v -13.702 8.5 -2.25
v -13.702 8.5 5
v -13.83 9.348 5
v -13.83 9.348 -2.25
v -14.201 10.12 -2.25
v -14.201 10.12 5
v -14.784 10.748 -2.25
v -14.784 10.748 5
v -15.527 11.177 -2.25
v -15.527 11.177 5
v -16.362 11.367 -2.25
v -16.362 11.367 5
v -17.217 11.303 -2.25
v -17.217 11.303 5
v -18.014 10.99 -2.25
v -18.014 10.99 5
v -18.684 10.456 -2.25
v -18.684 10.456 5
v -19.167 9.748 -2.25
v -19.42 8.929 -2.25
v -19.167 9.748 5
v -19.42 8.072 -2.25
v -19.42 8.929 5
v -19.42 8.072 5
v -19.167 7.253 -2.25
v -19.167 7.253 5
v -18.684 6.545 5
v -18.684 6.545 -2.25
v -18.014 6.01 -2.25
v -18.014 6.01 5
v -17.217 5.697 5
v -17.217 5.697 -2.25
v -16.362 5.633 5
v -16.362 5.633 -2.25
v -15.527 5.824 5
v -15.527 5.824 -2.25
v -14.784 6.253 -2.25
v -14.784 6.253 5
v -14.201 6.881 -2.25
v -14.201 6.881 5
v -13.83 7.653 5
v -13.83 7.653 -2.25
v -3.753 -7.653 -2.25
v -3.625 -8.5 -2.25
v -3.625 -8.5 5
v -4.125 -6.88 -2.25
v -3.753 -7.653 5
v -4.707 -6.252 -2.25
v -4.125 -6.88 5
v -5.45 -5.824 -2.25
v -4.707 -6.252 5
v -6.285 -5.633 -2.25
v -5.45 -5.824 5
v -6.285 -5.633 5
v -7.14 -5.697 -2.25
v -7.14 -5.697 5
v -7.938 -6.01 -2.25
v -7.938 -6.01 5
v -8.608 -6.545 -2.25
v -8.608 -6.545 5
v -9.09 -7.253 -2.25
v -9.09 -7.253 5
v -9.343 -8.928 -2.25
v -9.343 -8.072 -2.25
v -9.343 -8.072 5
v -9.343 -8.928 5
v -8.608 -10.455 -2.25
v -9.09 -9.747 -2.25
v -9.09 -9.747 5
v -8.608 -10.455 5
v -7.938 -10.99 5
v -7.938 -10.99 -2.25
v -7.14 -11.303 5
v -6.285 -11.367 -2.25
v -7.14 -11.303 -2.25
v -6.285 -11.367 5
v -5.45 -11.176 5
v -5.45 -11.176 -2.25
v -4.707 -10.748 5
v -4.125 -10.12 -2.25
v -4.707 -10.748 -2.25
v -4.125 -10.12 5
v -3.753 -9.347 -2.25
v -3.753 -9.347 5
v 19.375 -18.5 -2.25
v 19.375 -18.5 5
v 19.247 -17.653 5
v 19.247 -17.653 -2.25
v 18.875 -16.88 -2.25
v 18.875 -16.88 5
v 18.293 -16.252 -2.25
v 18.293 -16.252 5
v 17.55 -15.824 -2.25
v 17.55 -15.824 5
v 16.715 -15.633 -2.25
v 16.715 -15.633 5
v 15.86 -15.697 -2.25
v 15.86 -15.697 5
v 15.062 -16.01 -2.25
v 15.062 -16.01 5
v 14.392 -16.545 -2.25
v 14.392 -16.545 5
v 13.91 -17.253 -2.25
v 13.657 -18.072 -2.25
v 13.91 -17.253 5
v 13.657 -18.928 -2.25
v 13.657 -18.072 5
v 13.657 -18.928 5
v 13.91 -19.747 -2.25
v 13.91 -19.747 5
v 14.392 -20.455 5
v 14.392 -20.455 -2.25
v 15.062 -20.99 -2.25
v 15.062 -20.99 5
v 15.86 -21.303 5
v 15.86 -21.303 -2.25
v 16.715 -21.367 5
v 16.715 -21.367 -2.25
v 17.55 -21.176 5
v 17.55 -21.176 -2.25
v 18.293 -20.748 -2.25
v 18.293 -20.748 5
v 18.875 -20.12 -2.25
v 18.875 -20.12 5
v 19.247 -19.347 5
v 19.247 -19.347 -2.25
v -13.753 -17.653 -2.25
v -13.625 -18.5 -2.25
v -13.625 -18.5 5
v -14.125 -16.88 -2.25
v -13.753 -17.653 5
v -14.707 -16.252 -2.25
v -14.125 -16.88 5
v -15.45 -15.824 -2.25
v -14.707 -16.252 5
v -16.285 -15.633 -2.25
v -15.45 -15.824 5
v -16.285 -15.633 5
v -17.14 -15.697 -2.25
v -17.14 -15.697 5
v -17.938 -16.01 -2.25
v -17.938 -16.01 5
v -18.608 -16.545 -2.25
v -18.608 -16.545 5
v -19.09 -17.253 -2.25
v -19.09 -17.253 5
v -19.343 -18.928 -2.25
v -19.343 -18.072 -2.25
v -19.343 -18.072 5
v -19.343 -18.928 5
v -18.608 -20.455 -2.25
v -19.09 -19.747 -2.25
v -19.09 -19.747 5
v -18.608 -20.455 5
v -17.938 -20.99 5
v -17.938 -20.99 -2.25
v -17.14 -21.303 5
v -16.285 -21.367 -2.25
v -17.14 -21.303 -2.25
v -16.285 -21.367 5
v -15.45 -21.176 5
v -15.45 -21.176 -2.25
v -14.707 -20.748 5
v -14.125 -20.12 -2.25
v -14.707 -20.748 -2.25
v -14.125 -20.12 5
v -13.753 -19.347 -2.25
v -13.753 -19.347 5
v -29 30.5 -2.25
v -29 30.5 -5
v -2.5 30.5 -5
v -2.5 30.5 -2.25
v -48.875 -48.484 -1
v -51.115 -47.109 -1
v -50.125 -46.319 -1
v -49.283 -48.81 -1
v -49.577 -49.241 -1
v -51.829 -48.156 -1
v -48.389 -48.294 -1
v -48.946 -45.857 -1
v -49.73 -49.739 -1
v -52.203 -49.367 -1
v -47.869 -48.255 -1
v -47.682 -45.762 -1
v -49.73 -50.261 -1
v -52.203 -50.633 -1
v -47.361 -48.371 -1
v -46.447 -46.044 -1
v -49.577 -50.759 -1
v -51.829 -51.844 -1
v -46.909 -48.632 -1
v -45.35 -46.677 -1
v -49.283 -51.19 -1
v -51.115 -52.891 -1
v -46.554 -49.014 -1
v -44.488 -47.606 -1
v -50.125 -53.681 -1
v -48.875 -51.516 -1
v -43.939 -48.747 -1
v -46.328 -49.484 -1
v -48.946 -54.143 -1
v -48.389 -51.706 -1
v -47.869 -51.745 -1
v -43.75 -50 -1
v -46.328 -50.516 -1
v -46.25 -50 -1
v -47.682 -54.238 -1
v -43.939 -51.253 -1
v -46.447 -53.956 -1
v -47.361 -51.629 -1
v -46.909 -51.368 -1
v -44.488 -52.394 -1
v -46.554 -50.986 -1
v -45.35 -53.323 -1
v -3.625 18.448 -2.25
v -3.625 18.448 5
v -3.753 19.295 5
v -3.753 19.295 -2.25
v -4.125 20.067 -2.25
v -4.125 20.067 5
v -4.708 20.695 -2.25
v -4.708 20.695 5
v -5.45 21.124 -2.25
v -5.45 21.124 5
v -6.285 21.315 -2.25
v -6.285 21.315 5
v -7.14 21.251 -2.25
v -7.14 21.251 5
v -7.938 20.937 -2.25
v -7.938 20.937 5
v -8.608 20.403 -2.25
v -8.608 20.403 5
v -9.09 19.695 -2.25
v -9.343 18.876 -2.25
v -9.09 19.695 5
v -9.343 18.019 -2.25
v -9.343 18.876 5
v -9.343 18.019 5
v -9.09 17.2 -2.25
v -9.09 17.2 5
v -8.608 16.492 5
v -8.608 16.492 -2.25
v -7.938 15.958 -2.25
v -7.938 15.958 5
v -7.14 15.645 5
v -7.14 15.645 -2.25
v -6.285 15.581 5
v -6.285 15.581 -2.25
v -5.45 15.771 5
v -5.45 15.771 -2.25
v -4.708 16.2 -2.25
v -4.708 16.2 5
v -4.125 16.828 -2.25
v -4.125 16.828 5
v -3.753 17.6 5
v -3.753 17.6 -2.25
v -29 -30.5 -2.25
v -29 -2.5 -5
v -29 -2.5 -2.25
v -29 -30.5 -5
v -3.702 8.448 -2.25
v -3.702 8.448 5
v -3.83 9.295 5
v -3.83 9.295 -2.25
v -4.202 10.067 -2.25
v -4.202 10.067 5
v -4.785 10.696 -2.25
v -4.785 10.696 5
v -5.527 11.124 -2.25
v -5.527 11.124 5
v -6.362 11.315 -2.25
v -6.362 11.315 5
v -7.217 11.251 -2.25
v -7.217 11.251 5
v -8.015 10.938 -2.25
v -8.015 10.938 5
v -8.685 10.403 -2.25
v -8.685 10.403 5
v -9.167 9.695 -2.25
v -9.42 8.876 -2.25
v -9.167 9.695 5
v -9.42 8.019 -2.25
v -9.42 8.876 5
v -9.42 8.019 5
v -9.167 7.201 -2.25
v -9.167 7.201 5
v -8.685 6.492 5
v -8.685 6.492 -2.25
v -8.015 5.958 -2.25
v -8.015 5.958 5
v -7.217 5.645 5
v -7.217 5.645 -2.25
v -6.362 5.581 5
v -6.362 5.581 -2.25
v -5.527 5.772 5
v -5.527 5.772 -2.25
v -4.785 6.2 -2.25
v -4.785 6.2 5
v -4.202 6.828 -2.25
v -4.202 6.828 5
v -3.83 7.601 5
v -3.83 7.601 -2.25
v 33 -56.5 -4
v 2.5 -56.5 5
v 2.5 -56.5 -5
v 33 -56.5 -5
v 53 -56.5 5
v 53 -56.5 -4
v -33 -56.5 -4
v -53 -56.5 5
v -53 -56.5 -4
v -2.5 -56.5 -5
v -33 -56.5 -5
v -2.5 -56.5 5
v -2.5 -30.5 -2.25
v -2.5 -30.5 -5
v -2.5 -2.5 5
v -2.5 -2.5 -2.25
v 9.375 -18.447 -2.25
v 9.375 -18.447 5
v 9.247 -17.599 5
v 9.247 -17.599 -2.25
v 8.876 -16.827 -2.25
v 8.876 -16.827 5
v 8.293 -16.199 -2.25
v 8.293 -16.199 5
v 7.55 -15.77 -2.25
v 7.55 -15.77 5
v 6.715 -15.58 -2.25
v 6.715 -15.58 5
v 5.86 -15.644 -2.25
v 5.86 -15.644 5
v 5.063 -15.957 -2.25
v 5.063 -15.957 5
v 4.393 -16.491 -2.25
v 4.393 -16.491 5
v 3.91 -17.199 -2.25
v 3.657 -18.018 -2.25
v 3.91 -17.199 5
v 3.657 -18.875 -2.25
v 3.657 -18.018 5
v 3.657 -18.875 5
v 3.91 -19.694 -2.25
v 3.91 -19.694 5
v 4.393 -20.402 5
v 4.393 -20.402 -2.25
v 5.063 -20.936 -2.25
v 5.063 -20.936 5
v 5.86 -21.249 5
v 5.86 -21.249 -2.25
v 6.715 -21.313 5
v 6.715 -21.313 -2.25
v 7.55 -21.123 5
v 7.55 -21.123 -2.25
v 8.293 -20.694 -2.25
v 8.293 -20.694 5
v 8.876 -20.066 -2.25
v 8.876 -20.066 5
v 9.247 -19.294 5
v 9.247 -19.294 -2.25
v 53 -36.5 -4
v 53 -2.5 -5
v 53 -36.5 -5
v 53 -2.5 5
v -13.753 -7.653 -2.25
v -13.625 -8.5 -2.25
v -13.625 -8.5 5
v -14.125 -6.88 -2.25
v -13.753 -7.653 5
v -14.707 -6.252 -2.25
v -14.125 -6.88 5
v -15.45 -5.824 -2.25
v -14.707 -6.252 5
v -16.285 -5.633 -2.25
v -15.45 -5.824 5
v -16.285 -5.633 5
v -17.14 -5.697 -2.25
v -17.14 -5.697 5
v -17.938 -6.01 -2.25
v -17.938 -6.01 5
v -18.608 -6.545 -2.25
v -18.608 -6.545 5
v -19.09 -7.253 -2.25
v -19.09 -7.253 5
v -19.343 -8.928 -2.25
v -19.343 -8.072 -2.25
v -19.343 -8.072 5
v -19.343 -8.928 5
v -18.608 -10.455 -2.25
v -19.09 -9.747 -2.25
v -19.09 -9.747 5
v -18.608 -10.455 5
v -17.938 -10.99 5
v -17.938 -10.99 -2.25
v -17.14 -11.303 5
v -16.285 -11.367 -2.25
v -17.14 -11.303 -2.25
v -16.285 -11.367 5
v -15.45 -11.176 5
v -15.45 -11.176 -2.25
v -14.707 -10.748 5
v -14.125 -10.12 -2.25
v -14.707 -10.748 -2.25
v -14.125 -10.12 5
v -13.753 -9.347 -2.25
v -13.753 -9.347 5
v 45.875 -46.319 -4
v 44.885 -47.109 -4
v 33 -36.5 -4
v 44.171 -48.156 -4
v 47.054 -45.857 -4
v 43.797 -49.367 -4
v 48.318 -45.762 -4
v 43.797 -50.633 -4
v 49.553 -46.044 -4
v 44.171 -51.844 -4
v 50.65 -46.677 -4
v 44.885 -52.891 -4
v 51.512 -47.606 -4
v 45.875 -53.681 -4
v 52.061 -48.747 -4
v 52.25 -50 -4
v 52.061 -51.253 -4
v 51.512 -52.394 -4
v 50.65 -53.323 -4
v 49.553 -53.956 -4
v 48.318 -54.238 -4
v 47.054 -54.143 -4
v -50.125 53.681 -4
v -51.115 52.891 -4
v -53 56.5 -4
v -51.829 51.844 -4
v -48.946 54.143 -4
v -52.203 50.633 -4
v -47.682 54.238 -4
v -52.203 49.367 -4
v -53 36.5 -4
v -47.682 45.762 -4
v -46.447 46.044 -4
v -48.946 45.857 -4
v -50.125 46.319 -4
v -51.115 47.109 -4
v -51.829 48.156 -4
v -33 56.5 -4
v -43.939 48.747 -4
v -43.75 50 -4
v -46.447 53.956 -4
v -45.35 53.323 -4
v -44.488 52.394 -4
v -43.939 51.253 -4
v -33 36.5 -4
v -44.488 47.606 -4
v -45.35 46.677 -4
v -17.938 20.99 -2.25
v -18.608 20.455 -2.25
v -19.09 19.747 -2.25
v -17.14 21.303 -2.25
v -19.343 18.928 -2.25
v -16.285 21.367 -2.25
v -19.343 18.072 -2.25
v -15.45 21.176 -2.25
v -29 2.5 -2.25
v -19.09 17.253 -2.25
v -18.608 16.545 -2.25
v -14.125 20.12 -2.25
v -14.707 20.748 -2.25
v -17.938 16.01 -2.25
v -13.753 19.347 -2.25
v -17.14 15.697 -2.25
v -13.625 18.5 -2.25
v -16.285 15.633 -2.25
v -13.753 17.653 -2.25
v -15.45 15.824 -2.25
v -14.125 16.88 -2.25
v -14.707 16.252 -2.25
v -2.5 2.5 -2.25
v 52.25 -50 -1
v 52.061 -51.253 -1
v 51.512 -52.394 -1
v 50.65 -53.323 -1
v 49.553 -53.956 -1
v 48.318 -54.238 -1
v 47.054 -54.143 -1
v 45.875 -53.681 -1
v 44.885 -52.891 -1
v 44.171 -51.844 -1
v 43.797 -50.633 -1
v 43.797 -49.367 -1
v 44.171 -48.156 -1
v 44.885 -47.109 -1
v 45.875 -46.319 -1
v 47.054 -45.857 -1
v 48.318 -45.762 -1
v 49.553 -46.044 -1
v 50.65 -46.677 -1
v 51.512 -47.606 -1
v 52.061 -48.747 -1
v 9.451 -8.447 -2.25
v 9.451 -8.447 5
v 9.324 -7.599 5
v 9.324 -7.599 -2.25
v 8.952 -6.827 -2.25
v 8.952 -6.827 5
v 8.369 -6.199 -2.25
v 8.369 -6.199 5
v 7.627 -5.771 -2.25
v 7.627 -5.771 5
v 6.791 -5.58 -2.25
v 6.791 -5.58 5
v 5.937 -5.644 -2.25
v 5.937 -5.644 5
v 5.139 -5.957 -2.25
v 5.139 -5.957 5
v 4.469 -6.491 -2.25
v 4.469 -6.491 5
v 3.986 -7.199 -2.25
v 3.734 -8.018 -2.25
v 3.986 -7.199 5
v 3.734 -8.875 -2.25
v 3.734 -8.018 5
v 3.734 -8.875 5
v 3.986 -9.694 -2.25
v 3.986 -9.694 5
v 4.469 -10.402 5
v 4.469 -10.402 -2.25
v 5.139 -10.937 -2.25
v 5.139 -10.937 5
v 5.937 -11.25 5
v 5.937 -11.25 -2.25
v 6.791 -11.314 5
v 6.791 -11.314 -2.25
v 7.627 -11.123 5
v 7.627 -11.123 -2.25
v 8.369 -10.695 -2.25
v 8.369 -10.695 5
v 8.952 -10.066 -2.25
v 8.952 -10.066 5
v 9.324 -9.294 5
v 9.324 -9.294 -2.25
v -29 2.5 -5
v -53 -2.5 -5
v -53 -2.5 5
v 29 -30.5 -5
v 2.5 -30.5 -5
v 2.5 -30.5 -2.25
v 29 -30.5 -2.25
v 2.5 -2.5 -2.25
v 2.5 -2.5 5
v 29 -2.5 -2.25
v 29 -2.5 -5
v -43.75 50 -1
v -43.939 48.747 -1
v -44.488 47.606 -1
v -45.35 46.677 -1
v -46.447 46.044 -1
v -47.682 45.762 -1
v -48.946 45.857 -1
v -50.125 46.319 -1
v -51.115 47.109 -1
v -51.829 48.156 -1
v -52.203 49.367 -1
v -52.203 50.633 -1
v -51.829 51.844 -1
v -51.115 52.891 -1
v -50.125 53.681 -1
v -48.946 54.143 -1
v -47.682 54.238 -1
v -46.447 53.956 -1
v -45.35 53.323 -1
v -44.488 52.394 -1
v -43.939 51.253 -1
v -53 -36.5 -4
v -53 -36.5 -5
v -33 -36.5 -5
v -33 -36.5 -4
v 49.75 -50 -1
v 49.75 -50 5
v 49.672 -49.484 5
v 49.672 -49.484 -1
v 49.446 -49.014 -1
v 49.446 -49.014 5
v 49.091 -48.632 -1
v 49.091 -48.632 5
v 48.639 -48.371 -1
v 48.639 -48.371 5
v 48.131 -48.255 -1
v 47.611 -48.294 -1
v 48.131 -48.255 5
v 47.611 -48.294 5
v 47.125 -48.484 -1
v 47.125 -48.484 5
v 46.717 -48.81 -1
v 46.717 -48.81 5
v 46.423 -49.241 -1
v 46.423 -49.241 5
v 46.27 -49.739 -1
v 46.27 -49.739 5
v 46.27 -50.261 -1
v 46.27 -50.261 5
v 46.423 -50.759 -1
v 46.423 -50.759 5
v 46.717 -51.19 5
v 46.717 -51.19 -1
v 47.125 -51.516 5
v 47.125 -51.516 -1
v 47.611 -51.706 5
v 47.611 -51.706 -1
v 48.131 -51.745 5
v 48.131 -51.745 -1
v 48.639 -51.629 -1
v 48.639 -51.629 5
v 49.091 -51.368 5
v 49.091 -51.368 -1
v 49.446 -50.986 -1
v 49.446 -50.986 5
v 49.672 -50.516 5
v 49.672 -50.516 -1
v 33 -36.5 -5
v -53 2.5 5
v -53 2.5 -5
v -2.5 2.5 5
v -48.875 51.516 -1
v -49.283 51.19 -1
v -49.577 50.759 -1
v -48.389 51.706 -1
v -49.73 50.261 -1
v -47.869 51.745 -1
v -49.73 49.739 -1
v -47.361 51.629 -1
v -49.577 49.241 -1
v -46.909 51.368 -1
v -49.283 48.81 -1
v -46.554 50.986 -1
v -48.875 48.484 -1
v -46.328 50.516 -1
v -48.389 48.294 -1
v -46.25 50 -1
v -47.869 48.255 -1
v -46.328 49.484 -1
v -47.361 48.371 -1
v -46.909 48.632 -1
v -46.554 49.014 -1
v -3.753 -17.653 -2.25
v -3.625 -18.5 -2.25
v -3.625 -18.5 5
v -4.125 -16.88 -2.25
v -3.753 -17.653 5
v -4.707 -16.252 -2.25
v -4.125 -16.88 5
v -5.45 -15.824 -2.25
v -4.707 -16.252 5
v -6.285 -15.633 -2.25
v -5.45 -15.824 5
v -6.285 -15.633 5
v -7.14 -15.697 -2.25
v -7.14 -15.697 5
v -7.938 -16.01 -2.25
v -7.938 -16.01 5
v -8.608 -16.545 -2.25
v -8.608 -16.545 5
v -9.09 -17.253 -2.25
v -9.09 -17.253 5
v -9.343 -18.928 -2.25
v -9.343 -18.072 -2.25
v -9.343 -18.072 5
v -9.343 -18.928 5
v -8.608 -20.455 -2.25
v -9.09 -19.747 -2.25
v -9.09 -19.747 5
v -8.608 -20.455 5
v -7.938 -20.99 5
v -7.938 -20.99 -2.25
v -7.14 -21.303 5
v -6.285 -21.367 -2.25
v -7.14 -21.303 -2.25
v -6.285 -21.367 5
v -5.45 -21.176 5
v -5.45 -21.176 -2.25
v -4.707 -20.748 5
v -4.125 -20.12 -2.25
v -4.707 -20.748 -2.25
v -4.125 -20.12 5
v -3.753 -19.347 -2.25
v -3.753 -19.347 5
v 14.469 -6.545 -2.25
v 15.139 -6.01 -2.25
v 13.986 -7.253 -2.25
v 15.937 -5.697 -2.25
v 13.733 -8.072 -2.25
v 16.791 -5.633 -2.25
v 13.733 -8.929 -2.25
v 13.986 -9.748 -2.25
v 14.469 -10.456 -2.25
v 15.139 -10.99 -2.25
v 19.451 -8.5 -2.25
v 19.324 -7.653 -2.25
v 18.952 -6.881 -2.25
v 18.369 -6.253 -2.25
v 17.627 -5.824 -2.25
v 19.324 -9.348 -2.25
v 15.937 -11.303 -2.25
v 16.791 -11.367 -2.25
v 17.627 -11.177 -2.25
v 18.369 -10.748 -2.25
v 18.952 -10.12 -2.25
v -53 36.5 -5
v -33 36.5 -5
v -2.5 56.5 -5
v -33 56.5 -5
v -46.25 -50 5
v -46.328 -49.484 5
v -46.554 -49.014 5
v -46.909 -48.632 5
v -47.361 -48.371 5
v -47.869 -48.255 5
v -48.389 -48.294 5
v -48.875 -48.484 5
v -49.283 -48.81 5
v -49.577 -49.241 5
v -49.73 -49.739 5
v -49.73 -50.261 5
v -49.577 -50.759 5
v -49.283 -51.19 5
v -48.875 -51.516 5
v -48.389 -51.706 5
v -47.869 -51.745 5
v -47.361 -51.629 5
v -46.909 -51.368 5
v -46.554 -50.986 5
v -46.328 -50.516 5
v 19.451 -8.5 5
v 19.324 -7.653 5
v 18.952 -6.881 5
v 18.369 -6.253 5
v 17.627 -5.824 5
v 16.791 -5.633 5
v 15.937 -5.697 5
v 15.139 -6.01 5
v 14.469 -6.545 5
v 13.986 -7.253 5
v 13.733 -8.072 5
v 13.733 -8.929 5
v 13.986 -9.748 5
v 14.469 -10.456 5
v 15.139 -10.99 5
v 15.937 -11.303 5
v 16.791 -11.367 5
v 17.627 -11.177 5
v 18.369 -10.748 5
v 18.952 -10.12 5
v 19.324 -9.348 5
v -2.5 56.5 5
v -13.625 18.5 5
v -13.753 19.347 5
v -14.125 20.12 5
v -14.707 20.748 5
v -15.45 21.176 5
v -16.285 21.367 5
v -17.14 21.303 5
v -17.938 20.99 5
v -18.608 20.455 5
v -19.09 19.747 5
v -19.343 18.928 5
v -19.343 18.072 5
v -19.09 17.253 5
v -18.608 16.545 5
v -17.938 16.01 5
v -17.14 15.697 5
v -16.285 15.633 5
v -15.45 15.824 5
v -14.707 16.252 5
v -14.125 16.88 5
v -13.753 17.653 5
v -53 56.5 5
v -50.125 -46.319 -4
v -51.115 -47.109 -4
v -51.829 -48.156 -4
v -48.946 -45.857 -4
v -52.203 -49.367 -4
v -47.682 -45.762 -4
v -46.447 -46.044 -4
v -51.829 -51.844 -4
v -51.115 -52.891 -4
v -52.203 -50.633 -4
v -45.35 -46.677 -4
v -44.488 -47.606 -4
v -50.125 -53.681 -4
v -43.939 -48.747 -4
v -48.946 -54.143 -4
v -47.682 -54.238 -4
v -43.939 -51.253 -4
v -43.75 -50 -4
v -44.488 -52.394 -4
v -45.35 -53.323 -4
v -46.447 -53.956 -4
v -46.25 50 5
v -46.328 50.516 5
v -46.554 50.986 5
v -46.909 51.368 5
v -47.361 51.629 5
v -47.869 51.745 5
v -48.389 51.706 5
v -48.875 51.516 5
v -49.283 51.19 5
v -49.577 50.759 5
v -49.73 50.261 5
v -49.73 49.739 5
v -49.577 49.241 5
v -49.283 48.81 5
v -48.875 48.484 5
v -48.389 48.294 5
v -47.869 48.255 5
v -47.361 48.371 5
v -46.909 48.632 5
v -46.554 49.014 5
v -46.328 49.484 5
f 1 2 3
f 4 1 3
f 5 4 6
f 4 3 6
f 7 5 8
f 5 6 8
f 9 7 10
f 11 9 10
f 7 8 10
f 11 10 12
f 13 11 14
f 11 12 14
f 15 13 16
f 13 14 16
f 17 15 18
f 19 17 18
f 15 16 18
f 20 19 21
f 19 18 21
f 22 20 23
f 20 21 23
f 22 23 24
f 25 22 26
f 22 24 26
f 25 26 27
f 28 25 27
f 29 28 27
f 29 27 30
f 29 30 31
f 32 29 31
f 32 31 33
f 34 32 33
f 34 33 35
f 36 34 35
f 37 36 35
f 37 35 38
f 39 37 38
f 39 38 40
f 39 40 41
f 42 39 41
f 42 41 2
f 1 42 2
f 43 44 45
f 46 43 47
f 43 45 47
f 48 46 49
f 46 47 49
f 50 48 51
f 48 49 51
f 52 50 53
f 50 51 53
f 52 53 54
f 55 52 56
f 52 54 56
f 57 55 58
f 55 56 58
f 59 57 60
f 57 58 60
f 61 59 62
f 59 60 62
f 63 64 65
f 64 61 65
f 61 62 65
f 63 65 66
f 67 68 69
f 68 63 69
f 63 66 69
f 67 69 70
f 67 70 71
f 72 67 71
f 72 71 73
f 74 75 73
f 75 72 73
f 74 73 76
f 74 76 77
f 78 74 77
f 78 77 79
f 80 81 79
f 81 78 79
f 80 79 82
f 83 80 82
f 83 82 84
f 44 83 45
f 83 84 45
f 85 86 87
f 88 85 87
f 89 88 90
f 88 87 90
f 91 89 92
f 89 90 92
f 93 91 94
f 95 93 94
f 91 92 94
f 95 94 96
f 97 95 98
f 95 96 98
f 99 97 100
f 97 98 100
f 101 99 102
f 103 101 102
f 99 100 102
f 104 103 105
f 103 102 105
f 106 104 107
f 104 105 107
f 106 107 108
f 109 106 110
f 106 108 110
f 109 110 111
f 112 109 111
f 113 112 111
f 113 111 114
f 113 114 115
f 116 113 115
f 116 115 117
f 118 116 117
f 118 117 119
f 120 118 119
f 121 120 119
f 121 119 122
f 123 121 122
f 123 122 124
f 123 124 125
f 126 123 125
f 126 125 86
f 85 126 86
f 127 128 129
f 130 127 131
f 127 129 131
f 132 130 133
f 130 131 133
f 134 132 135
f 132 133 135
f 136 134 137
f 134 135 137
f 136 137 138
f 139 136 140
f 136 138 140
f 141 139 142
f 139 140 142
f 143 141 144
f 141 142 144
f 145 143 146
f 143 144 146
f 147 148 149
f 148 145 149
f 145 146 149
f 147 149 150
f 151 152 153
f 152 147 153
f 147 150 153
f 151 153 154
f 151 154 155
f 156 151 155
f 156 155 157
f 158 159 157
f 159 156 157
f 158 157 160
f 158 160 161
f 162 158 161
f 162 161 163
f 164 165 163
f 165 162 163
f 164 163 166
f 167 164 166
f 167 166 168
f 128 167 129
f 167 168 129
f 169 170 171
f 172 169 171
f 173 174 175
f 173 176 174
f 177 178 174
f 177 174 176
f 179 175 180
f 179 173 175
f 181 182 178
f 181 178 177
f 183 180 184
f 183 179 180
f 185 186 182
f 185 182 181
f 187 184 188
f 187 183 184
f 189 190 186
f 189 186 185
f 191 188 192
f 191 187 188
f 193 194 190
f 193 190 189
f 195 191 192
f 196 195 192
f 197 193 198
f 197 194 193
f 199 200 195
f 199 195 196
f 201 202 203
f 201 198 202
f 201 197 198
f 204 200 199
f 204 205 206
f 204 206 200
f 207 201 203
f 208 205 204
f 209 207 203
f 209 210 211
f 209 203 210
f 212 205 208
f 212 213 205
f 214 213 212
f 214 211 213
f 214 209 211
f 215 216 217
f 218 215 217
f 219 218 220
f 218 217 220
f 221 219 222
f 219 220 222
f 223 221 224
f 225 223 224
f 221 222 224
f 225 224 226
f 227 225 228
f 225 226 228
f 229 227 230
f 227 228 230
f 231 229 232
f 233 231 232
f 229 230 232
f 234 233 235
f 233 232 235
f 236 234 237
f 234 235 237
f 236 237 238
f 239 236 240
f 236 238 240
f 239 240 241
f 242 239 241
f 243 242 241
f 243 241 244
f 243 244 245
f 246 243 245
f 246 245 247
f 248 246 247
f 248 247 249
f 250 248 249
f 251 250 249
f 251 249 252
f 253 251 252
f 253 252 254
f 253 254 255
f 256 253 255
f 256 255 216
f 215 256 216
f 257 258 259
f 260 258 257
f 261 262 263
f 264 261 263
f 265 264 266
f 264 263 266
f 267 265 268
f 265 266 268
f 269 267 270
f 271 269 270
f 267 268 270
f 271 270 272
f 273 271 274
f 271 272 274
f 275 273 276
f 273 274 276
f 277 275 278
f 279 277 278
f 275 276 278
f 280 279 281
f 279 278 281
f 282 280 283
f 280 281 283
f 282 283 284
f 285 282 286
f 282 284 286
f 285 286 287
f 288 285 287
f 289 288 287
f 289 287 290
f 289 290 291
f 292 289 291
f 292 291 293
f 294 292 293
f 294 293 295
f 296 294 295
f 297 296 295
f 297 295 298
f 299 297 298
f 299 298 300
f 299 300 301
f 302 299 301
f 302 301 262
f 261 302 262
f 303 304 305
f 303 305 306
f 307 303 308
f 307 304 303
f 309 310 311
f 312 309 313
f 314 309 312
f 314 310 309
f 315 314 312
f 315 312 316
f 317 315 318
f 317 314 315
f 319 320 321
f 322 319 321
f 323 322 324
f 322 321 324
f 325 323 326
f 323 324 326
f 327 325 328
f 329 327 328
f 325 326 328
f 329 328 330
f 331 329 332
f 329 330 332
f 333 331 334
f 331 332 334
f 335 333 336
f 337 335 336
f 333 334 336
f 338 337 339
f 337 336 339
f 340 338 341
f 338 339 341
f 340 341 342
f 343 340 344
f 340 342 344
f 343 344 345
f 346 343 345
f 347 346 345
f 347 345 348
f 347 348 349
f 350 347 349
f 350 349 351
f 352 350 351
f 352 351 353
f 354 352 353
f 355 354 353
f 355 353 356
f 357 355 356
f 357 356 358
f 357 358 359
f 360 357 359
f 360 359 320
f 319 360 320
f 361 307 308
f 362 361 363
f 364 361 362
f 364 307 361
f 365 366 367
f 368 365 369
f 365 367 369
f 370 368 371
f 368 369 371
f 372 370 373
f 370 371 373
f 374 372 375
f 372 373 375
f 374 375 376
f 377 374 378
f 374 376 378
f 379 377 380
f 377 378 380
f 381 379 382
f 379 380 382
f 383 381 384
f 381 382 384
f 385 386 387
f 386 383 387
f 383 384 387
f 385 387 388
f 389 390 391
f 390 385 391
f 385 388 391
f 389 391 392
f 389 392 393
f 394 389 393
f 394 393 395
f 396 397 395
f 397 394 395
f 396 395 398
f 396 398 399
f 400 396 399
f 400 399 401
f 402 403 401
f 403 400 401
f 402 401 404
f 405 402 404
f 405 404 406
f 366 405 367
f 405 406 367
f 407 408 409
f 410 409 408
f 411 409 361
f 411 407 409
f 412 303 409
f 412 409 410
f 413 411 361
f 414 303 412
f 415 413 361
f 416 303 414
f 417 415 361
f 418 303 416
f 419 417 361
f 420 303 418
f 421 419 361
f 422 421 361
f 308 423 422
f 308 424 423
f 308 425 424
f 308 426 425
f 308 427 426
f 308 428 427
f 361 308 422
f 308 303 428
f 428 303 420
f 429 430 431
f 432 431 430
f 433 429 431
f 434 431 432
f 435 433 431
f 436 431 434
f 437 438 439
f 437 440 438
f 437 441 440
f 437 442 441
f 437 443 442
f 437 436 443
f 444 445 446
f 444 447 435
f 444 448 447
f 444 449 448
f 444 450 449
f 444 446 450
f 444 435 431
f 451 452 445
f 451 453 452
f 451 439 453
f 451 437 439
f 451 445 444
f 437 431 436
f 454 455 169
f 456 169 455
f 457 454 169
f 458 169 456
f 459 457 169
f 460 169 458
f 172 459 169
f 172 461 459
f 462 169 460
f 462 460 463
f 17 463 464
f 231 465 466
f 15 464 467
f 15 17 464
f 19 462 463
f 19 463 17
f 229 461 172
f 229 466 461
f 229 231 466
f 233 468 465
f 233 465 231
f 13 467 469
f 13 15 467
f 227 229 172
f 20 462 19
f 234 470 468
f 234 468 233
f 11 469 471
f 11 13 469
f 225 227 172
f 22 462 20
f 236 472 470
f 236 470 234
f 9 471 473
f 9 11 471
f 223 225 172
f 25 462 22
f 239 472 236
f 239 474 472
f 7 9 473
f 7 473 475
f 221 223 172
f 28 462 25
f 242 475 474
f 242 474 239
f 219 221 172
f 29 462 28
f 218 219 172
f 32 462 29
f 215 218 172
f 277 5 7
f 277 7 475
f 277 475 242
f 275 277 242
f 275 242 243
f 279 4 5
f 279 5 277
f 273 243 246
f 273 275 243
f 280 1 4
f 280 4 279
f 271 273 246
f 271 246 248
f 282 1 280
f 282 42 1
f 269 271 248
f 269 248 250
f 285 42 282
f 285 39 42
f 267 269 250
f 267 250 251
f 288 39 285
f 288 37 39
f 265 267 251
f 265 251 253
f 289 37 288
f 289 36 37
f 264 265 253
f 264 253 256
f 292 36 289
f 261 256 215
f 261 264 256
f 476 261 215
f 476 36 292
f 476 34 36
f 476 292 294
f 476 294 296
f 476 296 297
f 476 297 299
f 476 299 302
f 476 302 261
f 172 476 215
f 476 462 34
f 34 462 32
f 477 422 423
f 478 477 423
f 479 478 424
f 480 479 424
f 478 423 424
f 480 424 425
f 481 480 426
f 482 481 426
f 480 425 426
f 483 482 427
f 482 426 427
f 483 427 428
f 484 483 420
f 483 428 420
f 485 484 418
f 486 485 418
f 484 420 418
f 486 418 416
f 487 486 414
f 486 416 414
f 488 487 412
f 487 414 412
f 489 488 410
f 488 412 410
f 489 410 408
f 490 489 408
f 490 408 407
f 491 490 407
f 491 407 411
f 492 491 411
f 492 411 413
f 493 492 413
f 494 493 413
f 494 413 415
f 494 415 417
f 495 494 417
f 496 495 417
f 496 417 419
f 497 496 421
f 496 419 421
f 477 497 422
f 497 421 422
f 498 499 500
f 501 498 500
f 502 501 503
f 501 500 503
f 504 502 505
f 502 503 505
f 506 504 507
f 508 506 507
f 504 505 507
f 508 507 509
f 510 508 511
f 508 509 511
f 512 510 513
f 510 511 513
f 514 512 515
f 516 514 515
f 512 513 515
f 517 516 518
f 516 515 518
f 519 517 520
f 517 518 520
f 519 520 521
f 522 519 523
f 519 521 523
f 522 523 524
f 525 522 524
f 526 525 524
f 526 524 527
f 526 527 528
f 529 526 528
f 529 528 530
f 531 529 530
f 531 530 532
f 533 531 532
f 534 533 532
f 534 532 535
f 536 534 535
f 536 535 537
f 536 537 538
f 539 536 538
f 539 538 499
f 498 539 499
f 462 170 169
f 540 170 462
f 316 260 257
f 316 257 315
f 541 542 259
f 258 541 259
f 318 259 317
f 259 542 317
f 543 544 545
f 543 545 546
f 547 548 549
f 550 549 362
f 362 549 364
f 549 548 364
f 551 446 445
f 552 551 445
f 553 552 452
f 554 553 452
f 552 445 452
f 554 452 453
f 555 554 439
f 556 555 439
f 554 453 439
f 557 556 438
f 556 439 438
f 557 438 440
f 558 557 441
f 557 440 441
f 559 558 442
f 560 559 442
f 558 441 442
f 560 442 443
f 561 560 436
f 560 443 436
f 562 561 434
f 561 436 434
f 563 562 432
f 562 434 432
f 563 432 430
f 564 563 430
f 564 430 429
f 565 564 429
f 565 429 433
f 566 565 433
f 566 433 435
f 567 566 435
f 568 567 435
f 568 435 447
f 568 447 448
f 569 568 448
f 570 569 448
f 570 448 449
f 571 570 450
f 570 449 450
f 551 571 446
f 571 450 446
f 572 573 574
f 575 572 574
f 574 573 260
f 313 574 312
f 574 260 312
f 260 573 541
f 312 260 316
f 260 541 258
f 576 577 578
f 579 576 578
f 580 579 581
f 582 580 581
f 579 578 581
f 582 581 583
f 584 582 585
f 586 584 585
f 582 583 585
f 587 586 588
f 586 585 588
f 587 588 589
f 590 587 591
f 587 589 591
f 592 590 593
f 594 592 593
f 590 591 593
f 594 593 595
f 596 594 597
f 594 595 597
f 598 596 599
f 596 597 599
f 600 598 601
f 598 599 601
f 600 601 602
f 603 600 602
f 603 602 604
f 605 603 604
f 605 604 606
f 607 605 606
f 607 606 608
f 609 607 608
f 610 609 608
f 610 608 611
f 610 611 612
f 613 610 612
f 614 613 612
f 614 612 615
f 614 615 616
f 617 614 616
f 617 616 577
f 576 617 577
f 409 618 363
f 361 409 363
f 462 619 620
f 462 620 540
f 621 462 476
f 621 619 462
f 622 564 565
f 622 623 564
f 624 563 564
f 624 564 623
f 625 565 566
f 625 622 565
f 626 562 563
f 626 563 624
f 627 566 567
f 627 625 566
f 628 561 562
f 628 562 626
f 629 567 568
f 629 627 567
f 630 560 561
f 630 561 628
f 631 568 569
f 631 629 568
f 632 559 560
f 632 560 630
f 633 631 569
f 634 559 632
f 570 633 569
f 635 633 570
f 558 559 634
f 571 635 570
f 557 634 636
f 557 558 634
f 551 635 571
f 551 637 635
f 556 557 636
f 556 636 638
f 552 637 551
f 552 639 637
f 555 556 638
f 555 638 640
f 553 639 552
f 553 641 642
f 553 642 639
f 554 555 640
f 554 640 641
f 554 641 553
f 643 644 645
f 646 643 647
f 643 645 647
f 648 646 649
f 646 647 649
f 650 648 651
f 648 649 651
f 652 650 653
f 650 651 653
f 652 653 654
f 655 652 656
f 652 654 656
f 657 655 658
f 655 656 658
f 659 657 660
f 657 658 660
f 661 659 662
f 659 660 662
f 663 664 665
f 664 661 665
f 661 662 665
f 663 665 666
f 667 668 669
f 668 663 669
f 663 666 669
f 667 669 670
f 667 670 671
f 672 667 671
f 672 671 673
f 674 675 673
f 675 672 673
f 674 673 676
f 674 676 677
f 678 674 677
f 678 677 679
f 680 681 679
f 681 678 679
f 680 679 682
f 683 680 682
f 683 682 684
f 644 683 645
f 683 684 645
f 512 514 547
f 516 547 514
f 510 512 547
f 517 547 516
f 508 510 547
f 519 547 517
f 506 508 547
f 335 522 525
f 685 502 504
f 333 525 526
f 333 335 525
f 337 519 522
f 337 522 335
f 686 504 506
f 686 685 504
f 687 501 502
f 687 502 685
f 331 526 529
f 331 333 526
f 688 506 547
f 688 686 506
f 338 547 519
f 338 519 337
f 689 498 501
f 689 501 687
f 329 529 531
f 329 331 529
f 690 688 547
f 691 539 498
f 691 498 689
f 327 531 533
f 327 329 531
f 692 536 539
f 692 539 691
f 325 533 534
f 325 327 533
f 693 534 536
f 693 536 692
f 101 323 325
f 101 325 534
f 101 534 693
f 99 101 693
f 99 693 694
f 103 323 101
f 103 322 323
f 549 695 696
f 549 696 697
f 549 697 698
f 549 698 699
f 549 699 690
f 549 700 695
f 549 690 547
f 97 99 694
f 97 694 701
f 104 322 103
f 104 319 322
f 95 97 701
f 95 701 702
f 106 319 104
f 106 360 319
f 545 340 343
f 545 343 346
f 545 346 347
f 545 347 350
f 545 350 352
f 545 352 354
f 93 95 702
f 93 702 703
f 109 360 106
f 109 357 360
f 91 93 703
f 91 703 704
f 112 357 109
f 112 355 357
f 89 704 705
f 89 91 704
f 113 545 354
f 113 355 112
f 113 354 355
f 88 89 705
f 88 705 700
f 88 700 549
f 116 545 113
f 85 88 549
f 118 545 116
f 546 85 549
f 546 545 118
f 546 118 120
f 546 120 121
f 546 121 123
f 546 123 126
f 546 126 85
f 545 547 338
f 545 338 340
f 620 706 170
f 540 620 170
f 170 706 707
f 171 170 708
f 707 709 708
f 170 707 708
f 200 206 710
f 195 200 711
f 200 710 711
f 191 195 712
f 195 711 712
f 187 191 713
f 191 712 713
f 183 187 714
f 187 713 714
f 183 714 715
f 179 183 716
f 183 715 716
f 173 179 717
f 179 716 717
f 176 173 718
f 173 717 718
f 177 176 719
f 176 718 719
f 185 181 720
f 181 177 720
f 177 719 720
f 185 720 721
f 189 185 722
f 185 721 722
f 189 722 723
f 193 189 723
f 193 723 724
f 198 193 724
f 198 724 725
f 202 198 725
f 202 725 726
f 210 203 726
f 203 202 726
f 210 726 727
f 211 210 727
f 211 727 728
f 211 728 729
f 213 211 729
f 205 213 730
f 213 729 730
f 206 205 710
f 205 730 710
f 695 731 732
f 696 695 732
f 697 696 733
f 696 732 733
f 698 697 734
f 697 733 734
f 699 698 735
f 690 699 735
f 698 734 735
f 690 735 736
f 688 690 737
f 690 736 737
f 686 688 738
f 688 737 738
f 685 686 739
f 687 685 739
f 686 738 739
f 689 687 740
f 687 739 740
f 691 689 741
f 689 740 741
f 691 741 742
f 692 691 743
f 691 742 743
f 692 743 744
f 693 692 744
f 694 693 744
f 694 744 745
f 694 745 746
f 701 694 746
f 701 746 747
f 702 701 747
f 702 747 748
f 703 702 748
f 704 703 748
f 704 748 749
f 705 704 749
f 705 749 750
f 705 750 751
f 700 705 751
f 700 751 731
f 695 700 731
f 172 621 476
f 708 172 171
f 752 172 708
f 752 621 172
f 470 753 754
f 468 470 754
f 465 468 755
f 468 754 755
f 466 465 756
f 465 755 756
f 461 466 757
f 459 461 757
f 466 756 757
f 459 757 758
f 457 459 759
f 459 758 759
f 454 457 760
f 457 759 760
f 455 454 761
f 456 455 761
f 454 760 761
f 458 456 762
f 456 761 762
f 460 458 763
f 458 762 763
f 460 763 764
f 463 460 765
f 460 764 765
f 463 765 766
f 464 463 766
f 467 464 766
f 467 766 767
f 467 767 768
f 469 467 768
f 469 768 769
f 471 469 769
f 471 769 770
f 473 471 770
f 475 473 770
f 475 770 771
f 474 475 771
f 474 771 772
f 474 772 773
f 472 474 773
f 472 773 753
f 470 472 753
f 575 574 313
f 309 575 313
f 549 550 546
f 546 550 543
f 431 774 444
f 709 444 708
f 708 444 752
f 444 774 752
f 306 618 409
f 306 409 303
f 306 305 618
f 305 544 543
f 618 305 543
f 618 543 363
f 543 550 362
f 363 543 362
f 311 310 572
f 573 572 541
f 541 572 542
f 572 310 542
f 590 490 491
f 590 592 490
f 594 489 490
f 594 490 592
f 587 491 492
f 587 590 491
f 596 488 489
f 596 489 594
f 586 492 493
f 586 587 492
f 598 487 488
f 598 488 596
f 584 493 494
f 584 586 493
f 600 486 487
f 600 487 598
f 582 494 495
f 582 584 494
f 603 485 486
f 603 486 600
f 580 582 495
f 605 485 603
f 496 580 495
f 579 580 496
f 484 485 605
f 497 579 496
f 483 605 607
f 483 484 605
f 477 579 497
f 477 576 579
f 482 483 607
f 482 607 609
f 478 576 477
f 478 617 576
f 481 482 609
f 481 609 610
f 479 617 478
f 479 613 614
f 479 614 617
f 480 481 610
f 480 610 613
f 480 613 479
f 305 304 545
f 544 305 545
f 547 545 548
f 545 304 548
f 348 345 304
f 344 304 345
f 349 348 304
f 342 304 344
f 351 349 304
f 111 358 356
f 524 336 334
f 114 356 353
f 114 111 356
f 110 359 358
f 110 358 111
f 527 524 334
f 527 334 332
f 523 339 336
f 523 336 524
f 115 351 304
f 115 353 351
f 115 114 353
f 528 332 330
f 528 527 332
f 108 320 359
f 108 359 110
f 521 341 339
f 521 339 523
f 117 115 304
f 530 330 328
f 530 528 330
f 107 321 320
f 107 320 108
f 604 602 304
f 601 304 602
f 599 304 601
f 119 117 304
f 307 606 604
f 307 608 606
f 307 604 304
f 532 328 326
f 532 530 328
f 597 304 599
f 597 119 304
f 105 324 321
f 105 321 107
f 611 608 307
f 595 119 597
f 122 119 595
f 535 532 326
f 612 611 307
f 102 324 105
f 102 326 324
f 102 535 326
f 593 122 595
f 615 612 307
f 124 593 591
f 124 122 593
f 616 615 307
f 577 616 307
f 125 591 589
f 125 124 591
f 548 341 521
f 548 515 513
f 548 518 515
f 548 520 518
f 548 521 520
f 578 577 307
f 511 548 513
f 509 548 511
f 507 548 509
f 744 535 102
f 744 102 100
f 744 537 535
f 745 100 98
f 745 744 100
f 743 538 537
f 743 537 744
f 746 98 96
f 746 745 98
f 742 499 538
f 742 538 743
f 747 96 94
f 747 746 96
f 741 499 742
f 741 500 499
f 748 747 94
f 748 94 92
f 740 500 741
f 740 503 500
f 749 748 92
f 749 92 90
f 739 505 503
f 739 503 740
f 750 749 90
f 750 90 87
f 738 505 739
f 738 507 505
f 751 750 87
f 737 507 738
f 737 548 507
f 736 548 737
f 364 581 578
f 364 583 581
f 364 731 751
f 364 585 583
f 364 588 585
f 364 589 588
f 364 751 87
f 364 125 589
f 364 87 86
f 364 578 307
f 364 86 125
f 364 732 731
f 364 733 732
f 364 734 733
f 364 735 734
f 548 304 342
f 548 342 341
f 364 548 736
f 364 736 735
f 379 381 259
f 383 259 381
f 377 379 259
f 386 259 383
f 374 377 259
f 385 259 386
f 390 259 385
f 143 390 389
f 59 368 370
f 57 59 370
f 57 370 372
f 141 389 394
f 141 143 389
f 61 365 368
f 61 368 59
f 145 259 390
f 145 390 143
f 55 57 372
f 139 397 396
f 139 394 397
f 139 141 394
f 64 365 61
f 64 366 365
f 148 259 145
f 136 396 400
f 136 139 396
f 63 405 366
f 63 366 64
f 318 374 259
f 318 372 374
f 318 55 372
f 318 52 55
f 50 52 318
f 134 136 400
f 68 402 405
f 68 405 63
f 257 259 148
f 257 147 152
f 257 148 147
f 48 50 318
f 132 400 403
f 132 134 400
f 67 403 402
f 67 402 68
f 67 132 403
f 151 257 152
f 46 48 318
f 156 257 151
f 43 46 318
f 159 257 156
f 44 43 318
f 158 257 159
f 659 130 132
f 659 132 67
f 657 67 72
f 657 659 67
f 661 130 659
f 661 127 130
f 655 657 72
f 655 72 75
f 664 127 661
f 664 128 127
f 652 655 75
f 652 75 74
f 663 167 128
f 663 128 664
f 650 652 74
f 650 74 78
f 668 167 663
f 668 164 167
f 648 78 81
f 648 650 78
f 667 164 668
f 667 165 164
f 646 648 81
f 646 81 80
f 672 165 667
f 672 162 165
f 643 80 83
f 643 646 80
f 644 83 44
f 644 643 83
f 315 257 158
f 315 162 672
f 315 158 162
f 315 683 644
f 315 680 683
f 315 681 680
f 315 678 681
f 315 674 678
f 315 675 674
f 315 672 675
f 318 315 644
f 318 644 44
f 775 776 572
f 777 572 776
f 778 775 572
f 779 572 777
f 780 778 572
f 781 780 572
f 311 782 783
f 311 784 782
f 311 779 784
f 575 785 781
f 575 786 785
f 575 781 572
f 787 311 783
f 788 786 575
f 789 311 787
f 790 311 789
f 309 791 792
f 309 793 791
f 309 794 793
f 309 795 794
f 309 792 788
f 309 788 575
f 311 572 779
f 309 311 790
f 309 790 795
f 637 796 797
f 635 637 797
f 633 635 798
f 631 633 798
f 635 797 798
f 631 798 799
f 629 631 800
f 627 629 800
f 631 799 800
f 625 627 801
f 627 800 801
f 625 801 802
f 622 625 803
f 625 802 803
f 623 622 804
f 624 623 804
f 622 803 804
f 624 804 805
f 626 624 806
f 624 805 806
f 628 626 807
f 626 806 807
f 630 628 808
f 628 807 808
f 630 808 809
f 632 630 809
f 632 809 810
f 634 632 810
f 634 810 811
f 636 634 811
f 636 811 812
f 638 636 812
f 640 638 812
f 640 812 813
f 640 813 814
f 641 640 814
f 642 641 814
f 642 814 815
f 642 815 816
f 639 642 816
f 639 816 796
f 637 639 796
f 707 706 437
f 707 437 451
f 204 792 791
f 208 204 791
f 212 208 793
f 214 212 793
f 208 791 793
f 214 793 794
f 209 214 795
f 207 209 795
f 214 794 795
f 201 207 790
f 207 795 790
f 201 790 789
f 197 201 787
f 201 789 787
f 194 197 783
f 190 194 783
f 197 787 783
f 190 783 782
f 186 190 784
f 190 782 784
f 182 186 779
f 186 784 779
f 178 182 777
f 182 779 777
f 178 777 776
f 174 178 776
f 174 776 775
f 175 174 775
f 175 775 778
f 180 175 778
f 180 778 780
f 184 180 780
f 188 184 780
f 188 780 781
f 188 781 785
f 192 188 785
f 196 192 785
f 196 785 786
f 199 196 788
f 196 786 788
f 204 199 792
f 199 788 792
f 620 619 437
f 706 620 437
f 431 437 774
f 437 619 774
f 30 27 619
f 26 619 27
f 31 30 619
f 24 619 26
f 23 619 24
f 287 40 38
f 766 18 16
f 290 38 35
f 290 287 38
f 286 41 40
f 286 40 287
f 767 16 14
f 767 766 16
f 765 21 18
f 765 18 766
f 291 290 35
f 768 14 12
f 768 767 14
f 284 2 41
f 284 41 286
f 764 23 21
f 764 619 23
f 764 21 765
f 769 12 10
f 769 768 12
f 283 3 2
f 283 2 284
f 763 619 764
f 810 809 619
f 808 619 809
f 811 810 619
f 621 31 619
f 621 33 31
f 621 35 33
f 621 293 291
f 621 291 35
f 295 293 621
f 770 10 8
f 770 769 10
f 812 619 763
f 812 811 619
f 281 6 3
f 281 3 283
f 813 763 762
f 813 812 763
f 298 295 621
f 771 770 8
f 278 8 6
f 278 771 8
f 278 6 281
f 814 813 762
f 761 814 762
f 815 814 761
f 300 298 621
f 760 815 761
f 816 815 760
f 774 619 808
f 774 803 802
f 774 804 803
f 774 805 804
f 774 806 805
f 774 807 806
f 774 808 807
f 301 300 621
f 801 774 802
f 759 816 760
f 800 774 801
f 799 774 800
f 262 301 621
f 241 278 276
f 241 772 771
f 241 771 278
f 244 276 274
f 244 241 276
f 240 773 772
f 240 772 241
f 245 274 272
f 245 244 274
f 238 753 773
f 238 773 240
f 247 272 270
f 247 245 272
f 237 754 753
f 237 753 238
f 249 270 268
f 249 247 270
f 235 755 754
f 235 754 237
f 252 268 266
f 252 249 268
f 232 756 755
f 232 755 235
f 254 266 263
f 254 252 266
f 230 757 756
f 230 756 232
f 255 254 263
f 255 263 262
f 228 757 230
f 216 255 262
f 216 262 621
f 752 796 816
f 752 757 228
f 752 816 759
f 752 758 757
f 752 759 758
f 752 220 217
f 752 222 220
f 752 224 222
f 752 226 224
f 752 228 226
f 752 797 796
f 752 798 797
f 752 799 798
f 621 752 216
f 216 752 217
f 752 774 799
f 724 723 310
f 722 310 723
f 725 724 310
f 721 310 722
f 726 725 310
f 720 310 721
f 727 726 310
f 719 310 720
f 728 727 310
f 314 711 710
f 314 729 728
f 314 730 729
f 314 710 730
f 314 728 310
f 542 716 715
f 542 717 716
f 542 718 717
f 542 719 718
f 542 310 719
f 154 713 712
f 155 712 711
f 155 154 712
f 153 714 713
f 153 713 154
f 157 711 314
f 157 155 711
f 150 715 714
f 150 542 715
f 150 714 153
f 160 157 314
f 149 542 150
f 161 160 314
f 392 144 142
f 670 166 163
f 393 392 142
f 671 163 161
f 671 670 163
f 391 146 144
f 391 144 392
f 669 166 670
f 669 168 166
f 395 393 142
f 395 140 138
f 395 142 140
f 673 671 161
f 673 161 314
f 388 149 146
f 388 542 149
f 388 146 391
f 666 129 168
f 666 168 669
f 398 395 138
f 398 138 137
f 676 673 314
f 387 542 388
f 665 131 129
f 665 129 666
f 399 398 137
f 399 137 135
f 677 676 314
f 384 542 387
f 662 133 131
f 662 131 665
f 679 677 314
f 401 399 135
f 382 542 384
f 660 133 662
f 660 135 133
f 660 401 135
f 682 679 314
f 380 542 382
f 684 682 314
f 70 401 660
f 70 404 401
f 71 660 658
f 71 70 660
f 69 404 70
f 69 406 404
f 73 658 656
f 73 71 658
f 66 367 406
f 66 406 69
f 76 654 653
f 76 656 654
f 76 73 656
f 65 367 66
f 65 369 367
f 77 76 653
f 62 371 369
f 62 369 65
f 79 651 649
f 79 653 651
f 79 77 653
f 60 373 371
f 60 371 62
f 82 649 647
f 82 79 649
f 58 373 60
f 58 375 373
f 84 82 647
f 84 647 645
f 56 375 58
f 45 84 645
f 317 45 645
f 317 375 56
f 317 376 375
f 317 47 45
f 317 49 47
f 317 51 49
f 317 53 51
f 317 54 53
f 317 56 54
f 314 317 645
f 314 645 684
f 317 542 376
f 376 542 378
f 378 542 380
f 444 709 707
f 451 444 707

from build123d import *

# Parameters (mm, degrees)
F0_W      = 50.5
F0_H      = 54
F1_DEPTH  = 5
F2_R      = 1.75
F3_DEPTH  = 10
F4_R      = 2.875
F5_DEPTH  = 10
F6_W      = 26.5
F6_H      = 28
F6_R      = 2.875
F7_DEPTH  = 2.75
F8_W      = 20
F8_H      = 20
F8_R      = 1.75
F9_DEPTH  = 1
F10_R     = 4.25
F10_R_2   = 1.75
F11_DEPTH = 3


# Not quite as in the source:
# - a feature names something its author has since deleted; it is built from what else it names


with BuildPart() as f1:
    # F0 (on Top) → F1 (new body, symmetric)
    with BuildSketch(Plane.XY):
        with Locations((-27.75, 29.5)):
            Rectangle(F0_W, F0_H)
    extrude(amount=F1_DEPTH, both=True)


with BuildPart() as f1b:
    # F0 (on Top) → F1, piece 2 (new body, symmetric)
    with BuildSketch(Plane.XY):
        with Locations((-27.75, -29.5)):
            Rectangle(F0_W, F0_H)
    extrude(amount=F1_DEPTH, both=True)


with BuildPart() as f1c:
    # F0 (on Top) → F1, piece 3 (new body, symmetric)
    with BuildSketch(Plane.XY):
        with Locations((27.75, -29.5)):
            Rectangle(F0_W, F0_H)
    extrude(amount=F1_DEPTH, both=True)


with BuildPart() as f3_tool:
    # F2 (on face) → F3 (new body)
    with BuildSketch(Plane.XY.offset(5)):
        with Locations((-48, 50)):
            Circle(F2_R)
        with Locations((-48, -50)):
            Circle(F2_R)
        with Locations((48, -50)):
            Circle(F2_R)
    extrude(amount=-F3_DEPTH)


with BuildPart() as f1_1:
    add(f1.part)

    # F3: cut by f3_tool
    add(f3_tool.part, mode=Mode.SUBTRACT)


with BuildPart() as f1b_1:
    add(f1b.part)

    # F3: cut by f3_tool
    add(f3_tool.part, mode=Mode.SUBTRACT)


with BuildPart() as f1c_1:
    add(f1c.part)

    # F3: cut by f3_tool
    add(f3_tool.part, mode=Mode.SUBTRACT)


with BuildPart() as f5_tool:
    # F4 (on face) → F5 (new body)
    with BuildSketch(Plane.XY.offset(5)):
        with Locations((-6.5001370548, 18.4476446966)):
            Circle(F4_R)
        with Locations((-16.5, 18.5)):
            Circle(F4_R)
        with Locations((-16.5769208012, 8.5002958449)):
            Circle(F4_R)
        with Locations((-6.577057856, 8.4479405415)):
            Circle(F4_R)
        with Locations((-6.5, -8.5)):
            Circle(F4_R)
        with Locations((-16.5, -8.5)):
            Circle(F4_R)
        with Locations((-16.5, -18.5)):
            Circle(F4_R)
        with Locations((-6.5, -18.5)):
            Circle(F4_R)
        with Locations((6.5001429807, -18.4465248288)):
            Circle(F4_R)
        with Locations((6.5764766346, -8.4468161744)):
            Circle(F4_R)
        with Locations((16.5763336539, -8.5002913456)):
            Circle(F4_R)
        with Locations((16.5, -18.5)):
            Circle(F4_R)
    extrude(amount=-F5_DEPTH)


with BuildPart() as f1_2:
    add(f1_1.part)

    # F5: cut by f5_tool
    add(f5_tool.part, mode=Mode.SUBTRACT)


with BuildPart() as f1b_2:
    add(f1b_1.part)

    # F5: cut by f5_tool
    add(f5_tool.part, mode=Mode.SUBTRACT)


with BuildPart() as f1c_2:
    add(f1c_1.part)

    # F5: cut by f5_tool
    add(f5_tool.part, mode=Mode.SUBTRACT)


with BuildPart() as f7_tool:
    # F6 (on face) → F7 (new body)
    with BuildSketch(Plane(origin=(0, 0, -5), x_dir=(1, 0, 0), z_dir=(0, 0, -1))):
        with Locations((15.75, 16.5)):
            Rectangle(F6_W, F6_H)
        with Locations((-15.75, -16.5)):
            Rectangle(F6_W, F6_H)
        with Locations((-15.75, 16.5)):
            Rectangle(F6_W, F6_H)
        with Locations((-16.5, 8.5)):
            Circle(F6_R, mode=Mode.SUBTRACT)
        with Locations((-6.5, 8.5)):
            Circle(F6_R, mode=Mode.SUBTRACT)
        with Locations((-16.5, 18.5)):
            Circle(F6_R, mode=Mode.SUBTRACT)
        with Locations((-6.5, 18.5)):
            Circle(F6_R, mode=Mode.SUBTRACT)
    extrude(amount=-F7_DEPTH)


with BuildPart() as f1_3:
    add(f1_2.part)

    # F7: cut by f7_tool
    add(f7_tool.part, mode=Mode.SUBTRACT)


with BuildPart() as f1b_3:
    add(f1b_2.part)

    # F7: cut by f7_tool
    add(f7_tool.part, mode=Mode.SUBTRACT)


with BuildPart() as f1c_3:
    add(f1c_2.part)

    # F7: cut by f7_tool
    add(f7_tool.part, mode=Mode.SUBTRACT)


with BuildPart() as f9_tool:
    # F8 (on face) → F9 (new body)
    with BuildSketch(Plane(origin=(0, 0, -5), x_dir=(1, 0, 0), z_dir=(0, 0, -1))):
        with Locations((-43, -46.5)):
            Rectangle(F8_W, F8_H)
        with Locations((-48, -50)):
            Circle(F8_R, mode=Mode.SUBTRACT)
        with Locations((-43, 46.5)):
            Rectangle(F8_W, F8_H)
        with Locations((43, 46.5)):
            Rectangle(F8_W, F8_H)
    extrude(amount=-F9_DEPTH)


with BuildPart() as f1_4:
    add(f1_3.part)

    # F9: cut by f9_tool
    add(f9_tool.part, mode=Mode.SUBTRACT)


with BuildPart() as f1b_4:
    add(f1b_3.part)

    # F9: cut by f9_tool
    add(f9_tool.part, mode=Mode.SUBTRACT)


with BuildPart() as f1c_4:
    add(f1c_3.part)

    # F9: cut by f9_tool
    add(f9_tool.part, mode=Mode.SUBTRACT)


with BuildPart() as f11_tool:
    # F10 (on face) → F11 (new body)
    with BuildSketch(Plane(origin=(0, 0, -4), x_dir=(1, 0, 0), z_dir=(0, 0, -1))):
        with Locations((-48, 50)):
            Circle(F10_R)
        with Locations((-48, 50)):
            Circle(F10_R_2, mode=Mode.SUBTRACT)
        with Locations((48, 50)):
            Circle(F10_R)
        with Locations((-48, -50)):
            Circle(F10_R)
    extrude(amount=-F11_DEPTH)


with BuildPart() as f1_5:
    add(f1_4.part)

    # F11: cut by f11_tool
    add(f11_tool.part, mode=Mode.SUBTRACT)


with BuildPart() as f1b_5:
    add(f1b_4.part)

    # F11: cut by f11_tool
    add(f11_tool.part, mode=Mode.SUBTRACT)


with BuildPart() as f1c_5:
    add(f1c_4.part)

    # F11: cut by f11_tool
    add(f11_tool.part, mode=Mode.SUBTRACT)


solid = Compound([f1_5.part, f1b_5.part, f1c_5.part])
